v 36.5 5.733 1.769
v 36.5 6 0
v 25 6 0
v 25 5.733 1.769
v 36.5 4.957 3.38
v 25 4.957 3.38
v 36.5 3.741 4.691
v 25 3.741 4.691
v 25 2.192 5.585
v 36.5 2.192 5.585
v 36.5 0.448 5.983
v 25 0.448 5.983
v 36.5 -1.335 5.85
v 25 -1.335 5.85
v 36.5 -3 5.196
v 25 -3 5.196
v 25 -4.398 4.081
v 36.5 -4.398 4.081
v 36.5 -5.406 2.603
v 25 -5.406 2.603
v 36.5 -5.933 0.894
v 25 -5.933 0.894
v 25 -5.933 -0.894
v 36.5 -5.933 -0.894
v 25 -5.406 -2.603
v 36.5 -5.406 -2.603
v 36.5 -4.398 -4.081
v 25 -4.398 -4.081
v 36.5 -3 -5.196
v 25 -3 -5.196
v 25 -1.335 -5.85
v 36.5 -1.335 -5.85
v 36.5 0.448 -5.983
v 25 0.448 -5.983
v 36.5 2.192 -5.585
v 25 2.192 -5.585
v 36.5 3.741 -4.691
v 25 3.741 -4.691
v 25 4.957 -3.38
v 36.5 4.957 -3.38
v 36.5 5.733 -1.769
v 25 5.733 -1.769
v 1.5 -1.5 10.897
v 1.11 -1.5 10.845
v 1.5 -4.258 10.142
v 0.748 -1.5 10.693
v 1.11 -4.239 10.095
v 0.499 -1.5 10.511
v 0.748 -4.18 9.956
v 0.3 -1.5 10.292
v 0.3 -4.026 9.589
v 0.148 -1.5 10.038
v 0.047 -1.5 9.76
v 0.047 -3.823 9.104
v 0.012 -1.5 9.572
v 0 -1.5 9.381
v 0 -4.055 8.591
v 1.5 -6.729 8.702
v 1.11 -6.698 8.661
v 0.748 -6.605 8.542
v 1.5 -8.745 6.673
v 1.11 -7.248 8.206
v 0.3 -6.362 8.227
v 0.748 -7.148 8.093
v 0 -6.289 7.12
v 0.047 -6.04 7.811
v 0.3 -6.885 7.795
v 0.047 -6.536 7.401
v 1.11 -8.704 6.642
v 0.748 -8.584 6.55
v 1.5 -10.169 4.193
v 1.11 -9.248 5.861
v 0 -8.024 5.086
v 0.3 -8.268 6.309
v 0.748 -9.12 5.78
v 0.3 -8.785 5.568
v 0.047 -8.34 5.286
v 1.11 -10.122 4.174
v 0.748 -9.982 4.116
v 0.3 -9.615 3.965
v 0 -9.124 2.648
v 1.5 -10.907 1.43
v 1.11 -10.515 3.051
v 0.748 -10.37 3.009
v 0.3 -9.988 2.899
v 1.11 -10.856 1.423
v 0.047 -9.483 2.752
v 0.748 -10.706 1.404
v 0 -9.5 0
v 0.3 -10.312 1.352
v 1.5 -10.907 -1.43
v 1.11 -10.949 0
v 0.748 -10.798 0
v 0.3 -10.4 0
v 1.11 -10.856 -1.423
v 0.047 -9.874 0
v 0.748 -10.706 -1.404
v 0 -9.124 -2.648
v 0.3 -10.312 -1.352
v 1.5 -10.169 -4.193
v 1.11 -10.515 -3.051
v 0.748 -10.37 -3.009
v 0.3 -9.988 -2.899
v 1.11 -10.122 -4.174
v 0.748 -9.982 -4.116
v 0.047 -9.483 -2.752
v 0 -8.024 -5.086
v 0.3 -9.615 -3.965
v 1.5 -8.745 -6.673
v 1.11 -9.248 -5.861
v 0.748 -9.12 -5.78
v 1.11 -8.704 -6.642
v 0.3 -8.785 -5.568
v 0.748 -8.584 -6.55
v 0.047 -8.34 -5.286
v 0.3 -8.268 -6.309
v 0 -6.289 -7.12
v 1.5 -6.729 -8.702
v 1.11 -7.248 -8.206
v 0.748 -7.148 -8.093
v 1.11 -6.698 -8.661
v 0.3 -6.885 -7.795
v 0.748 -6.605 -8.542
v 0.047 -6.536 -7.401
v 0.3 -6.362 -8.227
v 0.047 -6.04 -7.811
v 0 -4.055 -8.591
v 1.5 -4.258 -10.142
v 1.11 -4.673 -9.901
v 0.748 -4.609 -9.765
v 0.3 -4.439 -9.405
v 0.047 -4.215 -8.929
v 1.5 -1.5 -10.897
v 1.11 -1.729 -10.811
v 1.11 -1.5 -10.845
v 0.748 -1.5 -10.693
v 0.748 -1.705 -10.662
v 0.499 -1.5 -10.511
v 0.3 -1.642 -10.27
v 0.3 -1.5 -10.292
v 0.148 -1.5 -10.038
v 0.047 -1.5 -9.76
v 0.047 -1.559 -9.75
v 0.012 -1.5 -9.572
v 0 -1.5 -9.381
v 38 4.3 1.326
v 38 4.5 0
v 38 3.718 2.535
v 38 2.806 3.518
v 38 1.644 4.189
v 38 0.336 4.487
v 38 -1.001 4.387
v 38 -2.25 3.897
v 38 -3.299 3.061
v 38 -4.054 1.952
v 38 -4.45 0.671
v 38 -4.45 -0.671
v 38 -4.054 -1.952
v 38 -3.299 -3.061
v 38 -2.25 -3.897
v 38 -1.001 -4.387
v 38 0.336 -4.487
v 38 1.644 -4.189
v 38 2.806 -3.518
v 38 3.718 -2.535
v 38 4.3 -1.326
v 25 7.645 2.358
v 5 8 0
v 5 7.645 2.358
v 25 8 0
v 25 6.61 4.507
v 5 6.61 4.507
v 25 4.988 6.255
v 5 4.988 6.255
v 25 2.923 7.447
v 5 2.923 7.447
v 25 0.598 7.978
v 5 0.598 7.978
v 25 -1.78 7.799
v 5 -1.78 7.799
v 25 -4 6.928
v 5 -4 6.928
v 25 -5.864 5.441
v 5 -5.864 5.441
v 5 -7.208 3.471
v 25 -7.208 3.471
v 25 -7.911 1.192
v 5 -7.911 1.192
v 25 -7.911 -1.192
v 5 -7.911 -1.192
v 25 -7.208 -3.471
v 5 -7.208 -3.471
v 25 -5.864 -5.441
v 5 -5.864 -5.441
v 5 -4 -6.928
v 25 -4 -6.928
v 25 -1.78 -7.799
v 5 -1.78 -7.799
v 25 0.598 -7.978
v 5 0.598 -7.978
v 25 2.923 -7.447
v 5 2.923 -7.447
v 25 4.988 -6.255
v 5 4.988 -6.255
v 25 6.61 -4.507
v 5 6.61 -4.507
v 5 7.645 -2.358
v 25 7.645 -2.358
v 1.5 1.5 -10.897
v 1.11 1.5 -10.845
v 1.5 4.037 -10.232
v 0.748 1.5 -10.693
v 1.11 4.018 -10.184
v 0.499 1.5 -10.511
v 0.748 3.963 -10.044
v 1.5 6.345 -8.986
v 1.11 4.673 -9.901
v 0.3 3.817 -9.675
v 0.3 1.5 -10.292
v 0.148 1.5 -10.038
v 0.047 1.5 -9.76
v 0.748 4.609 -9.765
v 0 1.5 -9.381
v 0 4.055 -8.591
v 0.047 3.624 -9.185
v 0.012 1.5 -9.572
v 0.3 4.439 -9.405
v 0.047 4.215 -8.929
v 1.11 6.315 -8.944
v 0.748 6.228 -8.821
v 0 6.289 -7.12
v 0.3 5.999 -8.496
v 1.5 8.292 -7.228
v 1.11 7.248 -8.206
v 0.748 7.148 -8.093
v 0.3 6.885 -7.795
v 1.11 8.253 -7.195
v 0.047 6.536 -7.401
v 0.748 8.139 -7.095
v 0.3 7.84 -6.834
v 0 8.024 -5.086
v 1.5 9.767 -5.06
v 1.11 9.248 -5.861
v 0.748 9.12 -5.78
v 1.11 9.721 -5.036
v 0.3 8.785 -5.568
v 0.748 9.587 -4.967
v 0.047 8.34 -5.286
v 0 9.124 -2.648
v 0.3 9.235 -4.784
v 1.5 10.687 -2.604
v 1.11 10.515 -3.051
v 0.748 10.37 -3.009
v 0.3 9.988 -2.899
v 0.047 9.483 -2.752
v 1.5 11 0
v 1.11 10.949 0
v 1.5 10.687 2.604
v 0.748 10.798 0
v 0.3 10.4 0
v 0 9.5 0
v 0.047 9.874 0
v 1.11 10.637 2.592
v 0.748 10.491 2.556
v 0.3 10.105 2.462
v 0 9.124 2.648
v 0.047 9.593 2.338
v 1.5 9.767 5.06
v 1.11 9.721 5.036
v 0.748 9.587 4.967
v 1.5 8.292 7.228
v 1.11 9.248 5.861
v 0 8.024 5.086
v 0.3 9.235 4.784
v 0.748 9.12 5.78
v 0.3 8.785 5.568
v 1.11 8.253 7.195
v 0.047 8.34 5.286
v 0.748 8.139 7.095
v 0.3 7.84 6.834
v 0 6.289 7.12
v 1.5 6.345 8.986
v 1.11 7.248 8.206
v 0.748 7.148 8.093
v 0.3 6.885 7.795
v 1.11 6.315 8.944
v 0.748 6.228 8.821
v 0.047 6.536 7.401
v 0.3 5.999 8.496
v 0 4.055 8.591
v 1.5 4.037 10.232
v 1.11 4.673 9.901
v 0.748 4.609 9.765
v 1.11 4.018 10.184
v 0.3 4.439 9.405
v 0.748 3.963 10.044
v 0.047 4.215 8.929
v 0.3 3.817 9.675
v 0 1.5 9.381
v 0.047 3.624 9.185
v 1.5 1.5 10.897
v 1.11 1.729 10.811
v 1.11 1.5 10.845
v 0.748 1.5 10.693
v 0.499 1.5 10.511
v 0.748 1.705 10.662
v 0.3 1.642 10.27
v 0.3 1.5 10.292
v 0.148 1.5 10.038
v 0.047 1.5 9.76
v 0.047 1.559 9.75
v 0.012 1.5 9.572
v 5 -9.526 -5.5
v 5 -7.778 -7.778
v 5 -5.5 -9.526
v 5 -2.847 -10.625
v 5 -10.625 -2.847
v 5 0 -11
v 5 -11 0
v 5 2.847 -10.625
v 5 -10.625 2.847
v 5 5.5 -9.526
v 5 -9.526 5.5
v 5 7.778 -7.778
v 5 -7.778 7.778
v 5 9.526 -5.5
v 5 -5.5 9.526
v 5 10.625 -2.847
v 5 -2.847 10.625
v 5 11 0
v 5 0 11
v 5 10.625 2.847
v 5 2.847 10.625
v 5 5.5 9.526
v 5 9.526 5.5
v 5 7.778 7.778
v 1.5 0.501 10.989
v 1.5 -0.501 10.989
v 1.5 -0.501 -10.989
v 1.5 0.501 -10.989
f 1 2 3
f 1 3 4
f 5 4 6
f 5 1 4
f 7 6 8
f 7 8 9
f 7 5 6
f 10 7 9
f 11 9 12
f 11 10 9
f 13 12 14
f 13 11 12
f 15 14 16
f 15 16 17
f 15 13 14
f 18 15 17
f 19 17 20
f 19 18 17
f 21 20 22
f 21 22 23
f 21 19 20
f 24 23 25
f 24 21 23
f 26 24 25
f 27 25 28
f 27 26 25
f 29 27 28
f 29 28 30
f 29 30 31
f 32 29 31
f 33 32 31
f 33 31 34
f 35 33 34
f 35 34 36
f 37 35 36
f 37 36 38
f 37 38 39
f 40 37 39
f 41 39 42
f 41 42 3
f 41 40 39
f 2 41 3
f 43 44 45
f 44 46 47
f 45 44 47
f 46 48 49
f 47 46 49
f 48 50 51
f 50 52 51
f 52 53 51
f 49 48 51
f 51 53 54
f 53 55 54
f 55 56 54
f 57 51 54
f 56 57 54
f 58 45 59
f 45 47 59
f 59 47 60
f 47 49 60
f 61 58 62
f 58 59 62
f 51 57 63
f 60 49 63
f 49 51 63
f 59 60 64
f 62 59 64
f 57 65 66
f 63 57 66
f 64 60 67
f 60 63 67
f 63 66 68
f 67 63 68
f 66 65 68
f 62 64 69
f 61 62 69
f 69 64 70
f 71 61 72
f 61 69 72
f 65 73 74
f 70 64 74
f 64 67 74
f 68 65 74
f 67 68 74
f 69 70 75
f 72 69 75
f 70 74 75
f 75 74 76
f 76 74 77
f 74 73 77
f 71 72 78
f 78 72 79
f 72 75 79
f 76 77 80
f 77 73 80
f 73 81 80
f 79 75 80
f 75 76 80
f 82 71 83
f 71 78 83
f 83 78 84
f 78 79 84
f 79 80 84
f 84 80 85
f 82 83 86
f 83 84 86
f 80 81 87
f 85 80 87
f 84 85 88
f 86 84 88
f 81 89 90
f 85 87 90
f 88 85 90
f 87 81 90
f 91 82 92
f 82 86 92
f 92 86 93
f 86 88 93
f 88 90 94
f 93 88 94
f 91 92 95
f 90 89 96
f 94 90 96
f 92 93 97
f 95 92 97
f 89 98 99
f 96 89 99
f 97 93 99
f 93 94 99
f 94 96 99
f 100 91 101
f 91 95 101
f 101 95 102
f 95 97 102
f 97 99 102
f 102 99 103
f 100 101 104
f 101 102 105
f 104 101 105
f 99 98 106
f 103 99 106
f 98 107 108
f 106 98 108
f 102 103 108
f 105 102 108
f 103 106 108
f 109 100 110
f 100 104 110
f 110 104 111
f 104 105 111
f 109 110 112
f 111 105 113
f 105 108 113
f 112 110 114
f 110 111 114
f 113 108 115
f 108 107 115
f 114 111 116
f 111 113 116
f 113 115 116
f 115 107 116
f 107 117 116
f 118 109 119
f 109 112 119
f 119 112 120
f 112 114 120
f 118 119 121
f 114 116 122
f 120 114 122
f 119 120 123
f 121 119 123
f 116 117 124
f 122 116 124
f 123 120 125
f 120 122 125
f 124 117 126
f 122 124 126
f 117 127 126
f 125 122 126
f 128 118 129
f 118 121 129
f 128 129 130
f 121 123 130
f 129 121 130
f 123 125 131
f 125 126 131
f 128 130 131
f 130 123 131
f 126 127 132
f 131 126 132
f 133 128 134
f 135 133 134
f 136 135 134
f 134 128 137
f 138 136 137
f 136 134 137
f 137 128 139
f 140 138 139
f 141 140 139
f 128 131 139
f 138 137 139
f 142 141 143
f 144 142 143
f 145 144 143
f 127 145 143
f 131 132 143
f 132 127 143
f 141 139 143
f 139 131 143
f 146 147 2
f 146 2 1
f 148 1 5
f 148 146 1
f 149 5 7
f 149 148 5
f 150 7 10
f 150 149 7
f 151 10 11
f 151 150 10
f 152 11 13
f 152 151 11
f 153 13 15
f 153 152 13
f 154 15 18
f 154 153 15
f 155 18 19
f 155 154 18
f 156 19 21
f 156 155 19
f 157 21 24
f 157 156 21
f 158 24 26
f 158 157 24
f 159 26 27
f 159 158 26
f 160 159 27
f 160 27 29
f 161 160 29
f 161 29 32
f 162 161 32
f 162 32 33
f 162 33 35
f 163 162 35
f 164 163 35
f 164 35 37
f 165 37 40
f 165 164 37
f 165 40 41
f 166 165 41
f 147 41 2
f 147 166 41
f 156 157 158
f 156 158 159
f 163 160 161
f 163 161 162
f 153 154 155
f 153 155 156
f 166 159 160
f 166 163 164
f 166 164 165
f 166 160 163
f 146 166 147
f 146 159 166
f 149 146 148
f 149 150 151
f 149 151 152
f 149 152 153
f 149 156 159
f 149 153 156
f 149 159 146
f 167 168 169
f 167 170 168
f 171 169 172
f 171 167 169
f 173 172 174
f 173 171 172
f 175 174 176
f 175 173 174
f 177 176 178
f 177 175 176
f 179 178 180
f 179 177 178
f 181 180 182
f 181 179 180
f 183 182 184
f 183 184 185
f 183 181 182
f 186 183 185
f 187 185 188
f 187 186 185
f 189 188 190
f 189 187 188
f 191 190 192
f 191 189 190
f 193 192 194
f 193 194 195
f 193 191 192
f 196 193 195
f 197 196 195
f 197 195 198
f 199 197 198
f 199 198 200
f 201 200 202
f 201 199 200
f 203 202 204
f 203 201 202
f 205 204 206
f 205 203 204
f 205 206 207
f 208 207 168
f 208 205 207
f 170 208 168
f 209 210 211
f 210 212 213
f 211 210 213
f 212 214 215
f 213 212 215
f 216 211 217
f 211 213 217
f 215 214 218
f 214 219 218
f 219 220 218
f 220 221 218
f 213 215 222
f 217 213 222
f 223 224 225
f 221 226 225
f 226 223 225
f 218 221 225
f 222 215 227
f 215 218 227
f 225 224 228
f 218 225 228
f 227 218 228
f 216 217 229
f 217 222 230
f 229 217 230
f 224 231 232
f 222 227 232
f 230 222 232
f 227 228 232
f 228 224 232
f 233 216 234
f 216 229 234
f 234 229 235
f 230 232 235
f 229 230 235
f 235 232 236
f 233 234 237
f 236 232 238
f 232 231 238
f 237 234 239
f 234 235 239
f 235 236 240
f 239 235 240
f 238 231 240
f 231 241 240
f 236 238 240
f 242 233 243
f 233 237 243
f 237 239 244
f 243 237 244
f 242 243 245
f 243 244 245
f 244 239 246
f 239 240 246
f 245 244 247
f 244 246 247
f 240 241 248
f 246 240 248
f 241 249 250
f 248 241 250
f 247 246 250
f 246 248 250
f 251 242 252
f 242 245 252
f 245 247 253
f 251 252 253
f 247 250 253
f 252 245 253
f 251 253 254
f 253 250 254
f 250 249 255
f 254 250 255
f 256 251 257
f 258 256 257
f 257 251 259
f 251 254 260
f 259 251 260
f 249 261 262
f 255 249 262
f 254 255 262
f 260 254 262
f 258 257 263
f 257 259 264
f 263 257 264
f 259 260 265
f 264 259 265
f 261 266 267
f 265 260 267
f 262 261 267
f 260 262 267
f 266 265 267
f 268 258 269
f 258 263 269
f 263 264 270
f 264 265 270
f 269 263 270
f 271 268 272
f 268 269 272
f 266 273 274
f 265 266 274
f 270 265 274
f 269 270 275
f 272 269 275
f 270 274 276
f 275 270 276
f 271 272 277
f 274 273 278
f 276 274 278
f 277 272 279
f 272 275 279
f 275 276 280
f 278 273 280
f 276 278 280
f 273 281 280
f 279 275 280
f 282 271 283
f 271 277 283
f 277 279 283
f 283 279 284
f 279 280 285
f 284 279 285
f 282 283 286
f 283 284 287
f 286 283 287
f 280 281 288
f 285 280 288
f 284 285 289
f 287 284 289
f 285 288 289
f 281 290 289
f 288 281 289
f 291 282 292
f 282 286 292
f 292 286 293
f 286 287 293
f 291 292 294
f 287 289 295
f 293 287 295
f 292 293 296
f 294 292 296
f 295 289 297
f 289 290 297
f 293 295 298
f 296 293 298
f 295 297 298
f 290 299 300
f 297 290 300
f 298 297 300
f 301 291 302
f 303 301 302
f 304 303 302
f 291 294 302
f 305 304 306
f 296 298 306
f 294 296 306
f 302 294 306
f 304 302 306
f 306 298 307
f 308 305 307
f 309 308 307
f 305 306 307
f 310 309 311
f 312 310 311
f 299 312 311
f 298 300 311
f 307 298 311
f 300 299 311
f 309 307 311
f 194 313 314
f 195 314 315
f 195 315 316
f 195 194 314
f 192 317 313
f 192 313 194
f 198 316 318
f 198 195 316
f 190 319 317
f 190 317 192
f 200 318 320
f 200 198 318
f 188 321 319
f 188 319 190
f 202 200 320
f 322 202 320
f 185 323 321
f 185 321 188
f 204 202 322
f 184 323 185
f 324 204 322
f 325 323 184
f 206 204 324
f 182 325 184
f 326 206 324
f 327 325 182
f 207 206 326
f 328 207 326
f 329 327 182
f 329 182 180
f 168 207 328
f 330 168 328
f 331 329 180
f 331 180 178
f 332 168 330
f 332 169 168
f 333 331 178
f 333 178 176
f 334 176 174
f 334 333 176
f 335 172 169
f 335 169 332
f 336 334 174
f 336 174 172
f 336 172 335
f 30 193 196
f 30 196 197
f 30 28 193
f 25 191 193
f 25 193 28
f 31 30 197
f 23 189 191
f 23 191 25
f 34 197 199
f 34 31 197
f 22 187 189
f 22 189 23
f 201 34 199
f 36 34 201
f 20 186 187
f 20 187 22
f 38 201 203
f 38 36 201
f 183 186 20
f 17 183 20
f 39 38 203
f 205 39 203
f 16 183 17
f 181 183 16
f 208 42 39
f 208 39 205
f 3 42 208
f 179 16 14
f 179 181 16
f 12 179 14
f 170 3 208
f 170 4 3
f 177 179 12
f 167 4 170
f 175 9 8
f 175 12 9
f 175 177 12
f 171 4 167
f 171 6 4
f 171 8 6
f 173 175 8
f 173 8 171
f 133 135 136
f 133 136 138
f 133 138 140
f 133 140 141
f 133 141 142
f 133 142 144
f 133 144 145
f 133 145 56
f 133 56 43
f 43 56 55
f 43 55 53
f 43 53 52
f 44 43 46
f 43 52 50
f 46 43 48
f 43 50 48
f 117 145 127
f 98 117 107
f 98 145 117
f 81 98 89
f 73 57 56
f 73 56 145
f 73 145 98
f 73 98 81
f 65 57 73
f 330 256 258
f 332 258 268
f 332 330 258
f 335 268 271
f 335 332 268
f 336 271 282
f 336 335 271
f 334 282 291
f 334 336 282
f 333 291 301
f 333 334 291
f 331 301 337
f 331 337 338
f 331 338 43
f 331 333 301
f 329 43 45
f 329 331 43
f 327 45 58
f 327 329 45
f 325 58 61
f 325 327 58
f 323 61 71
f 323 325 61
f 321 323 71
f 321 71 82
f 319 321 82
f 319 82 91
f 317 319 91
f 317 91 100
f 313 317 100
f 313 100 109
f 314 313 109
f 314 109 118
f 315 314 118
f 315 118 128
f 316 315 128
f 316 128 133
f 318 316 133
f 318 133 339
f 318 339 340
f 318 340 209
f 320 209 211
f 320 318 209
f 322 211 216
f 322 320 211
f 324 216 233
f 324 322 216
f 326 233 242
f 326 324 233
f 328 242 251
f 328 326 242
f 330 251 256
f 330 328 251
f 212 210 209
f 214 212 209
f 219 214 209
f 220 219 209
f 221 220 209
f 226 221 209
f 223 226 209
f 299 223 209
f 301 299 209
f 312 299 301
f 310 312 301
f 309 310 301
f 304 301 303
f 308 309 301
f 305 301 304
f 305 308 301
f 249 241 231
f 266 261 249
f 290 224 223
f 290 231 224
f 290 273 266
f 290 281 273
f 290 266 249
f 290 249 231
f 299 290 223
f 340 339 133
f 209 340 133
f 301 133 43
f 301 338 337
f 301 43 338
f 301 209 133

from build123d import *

# Parameters (mm, degrees)
CHAMFER1_SIZE      = 1.5
FILLET1_R          = 1.5
SKETCH3_W          = 23.767877036
SKETCH3_H          = 3
CUT_EXTRUDE1_DEPTH = 1.5


with BuildPart() as part:
    # Sketch1 → Revolve1 (revolve)
    with BuildSketch(Plane.XY):
        Polygon((0, 0), (0, 11), (5, 11), (5, 8), (25, 8), (25, 6), (38, 6), (38, 0), align=None)
    revolve(axis=Axis((-97.318857056, 0, 0), (1, 0, 0)))

    # Chamfer1
    chamfer1_edges = [part.edges().sort_by_distance(p)[0] for p in [
        (38, -6, 0),
    ]]
    chamfer(chamfer1_edges, length=CHAMFER1_SIZE)

    # Fillet1
    fillet1_edges = [part.edges().sort_by_distance(p)[0] for p in [
        (0, -11, 0),
    ]]
    fillet(fillet1_edges, radius=FILLET1_R)

    # Sketch3 → Cut-Extrude1 (cut)
    with BuildSketch(Plane.ZY):
        Rectangle(SKETCH3_W, SKETCH3_H)
    extrude(amount=-CUT_EXTRUDE1_DEPTH, mode=Mode.SUBTRACT)


solid = part.part
